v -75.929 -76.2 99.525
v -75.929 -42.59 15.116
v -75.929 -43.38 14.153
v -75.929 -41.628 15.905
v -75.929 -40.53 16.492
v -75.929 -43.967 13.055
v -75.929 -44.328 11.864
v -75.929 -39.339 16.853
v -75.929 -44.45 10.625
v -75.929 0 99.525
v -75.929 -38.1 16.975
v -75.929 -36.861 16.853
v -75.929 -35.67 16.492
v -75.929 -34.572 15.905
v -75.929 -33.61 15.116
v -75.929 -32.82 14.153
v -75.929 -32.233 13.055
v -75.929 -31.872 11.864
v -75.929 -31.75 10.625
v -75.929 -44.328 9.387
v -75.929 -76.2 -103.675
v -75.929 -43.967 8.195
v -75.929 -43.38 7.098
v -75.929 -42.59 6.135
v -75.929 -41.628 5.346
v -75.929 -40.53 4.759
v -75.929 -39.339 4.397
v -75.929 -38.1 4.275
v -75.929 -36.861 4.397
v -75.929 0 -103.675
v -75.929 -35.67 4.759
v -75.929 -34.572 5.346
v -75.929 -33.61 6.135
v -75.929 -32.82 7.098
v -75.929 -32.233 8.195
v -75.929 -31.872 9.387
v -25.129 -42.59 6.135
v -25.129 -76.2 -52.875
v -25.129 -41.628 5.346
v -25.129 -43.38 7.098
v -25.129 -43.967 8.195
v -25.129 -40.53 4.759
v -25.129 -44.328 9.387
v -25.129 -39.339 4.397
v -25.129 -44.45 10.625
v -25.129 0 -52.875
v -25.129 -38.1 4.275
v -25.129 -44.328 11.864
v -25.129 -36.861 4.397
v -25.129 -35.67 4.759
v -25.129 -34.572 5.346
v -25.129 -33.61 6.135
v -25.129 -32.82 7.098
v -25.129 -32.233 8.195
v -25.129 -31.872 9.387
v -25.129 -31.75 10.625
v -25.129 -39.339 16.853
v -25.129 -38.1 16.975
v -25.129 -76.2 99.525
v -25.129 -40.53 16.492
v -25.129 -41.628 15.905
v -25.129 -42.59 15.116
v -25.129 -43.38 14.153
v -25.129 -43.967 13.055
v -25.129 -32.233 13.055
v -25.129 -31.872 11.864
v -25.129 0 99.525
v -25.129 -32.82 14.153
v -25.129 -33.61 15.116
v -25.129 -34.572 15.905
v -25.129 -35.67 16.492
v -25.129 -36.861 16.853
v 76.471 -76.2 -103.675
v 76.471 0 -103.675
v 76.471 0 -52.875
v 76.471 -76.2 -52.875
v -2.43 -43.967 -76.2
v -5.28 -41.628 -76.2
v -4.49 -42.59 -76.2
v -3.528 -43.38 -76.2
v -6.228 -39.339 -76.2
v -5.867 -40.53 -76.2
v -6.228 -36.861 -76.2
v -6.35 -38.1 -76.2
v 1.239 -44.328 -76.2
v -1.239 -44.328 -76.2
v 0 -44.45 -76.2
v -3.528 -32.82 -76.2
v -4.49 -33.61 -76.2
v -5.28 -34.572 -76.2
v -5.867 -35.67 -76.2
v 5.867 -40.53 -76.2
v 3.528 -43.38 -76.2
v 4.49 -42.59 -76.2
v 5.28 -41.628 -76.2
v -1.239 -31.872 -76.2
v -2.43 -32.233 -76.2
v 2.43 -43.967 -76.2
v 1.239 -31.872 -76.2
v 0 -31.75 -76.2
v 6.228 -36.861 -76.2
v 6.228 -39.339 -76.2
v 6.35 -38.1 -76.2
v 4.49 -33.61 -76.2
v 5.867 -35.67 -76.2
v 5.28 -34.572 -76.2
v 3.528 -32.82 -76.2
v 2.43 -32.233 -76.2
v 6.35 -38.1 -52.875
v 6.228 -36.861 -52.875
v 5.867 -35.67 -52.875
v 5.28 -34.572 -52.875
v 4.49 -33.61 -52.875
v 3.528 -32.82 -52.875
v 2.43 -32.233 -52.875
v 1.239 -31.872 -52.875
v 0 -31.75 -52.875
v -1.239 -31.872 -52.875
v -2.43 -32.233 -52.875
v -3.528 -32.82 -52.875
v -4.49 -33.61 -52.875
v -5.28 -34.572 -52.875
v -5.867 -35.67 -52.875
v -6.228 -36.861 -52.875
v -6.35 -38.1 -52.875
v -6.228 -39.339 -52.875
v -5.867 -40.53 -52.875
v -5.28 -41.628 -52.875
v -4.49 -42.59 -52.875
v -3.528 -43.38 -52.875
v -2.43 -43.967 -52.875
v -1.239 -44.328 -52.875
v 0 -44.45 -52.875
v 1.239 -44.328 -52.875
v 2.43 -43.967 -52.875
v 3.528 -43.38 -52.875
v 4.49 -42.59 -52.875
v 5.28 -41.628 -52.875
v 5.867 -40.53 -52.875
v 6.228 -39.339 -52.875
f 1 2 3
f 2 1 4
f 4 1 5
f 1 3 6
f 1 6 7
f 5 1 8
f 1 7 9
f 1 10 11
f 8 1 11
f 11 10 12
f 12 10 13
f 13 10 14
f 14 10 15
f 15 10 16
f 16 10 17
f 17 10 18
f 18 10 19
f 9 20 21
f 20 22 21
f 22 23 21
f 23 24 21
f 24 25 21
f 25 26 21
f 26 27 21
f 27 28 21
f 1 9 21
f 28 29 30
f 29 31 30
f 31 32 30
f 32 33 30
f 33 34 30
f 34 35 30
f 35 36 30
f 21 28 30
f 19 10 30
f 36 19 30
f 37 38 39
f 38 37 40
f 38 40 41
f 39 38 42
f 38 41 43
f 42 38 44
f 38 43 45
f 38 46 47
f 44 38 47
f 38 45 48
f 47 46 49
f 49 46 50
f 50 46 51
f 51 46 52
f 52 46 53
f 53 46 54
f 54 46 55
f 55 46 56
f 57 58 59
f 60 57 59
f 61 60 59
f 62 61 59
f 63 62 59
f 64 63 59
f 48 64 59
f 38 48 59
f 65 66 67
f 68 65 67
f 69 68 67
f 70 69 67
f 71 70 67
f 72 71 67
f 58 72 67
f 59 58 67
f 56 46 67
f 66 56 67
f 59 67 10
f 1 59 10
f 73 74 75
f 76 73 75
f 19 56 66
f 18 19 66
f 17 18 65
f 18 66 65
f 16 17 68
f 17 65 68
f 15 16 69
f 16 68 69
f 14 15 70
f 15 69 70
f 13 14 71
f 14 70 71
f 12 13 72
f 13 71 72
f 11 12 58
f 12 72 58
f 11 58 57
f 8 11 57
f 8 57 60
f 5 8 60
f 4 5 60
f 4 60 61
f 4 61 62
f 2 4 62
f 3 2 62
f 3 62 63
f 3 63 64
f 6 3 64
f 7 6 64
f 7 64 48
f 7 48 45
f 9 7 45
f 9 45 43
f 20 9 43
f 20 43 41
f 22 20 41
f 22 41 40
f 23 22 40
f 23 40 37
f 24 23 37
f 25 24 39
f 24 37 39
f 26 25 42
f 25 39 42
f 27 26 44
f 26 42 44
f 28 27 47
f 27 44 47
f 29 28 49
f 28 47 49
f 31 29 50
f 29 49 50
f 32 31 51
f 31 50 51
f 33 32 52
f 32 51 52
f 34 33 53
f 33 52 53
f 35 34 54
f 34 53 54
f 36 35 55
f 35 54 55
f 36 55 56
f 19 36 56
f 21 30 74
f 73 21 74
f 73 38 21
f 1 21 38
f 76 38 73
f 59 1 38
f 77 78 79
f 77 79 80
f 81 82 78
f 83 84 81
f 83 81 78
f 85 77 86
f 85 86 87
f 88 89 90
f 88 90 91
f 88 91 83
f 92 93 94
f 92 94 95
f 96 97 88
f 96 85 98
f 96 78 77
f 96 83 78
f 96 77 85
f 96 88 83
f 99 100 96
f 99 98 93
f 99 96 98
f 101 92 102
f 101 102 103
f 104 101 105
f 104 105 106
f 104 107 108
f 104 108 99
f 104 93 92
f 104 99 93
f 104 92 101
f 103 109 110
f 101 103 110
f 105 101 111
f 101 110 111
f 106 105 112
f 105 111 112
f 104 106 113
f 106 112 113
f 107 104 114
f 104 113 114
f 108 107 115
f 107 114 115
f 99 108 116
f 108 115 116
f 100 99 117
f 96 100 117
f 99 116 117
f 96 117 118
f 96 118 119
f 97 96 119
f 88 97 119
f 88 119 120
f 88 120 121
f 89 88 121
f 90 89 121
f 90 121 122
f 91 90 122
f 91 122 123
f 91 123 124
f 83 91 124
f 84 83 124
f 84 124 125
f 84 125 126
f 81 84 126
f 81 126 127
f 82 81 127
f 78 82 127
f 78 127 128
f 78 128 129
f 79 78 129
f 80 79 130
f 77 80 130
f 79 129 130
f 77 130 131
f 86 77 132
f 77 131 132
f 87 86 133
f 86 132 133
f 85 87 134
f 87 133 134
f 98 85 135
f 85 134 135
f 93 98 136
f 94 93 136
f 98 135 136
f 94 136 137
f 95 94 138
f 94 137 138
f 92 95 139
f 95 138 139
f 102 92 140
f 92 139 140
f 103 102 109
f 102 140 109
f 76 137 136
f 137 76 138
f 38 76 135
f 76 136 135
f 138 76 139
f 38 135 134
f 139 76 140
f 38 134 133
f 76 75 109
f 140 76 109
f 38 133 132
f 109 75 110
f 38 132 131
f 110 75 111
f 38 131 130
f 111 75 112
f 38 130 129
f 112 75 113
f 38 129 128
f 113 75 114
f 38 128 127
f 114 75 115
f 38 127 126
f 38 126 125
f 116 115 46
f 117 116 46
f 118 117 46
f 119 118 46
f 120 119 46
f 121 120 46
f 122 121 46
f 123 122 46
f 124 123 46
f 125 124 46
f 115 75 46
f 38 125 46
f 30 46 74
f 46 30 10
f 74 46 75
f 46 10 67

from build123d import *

# Parameters (mm, degrees)
F1_DEPTH = 76.2
F2_R     = 6.35
F3_DEPTH = 76.2
F4_R     = 6.35
F5_DEPTH = 76.2


with BuildPart() as f1:
    # F0 (on Front) → F1 (new body)
    with BuildSketch(Plane.XZ):
        Polygon((-25.129344, 99.525434), (-75.929344, 99.525434), (-75.929344, -103.674566), (76.470656, -103.674566), (76.470656, -52.874566), (-25.129344, -52.874566), align=None)
    extrude(amount=F1_DEPTH)

    # F2 (on Right) → F3 (cut)
    with BuildSketch(Plane.YZ):
        with Locations((-38.1, 10.625434)):
            Circle(F2_R)
    extrude(amount=-F3_DEPTH, mode=Mode.SUBTRACT)

    # F4 (on Top) → F5 (cut)
    with BuildSketch(Plane.XY):
        with Locations((0, -38.1)):
            Circle(F4_R)
    extrude(amount=-F5_DEPTH, mode=Mode.SUBTRACT)


solid = f1.part
